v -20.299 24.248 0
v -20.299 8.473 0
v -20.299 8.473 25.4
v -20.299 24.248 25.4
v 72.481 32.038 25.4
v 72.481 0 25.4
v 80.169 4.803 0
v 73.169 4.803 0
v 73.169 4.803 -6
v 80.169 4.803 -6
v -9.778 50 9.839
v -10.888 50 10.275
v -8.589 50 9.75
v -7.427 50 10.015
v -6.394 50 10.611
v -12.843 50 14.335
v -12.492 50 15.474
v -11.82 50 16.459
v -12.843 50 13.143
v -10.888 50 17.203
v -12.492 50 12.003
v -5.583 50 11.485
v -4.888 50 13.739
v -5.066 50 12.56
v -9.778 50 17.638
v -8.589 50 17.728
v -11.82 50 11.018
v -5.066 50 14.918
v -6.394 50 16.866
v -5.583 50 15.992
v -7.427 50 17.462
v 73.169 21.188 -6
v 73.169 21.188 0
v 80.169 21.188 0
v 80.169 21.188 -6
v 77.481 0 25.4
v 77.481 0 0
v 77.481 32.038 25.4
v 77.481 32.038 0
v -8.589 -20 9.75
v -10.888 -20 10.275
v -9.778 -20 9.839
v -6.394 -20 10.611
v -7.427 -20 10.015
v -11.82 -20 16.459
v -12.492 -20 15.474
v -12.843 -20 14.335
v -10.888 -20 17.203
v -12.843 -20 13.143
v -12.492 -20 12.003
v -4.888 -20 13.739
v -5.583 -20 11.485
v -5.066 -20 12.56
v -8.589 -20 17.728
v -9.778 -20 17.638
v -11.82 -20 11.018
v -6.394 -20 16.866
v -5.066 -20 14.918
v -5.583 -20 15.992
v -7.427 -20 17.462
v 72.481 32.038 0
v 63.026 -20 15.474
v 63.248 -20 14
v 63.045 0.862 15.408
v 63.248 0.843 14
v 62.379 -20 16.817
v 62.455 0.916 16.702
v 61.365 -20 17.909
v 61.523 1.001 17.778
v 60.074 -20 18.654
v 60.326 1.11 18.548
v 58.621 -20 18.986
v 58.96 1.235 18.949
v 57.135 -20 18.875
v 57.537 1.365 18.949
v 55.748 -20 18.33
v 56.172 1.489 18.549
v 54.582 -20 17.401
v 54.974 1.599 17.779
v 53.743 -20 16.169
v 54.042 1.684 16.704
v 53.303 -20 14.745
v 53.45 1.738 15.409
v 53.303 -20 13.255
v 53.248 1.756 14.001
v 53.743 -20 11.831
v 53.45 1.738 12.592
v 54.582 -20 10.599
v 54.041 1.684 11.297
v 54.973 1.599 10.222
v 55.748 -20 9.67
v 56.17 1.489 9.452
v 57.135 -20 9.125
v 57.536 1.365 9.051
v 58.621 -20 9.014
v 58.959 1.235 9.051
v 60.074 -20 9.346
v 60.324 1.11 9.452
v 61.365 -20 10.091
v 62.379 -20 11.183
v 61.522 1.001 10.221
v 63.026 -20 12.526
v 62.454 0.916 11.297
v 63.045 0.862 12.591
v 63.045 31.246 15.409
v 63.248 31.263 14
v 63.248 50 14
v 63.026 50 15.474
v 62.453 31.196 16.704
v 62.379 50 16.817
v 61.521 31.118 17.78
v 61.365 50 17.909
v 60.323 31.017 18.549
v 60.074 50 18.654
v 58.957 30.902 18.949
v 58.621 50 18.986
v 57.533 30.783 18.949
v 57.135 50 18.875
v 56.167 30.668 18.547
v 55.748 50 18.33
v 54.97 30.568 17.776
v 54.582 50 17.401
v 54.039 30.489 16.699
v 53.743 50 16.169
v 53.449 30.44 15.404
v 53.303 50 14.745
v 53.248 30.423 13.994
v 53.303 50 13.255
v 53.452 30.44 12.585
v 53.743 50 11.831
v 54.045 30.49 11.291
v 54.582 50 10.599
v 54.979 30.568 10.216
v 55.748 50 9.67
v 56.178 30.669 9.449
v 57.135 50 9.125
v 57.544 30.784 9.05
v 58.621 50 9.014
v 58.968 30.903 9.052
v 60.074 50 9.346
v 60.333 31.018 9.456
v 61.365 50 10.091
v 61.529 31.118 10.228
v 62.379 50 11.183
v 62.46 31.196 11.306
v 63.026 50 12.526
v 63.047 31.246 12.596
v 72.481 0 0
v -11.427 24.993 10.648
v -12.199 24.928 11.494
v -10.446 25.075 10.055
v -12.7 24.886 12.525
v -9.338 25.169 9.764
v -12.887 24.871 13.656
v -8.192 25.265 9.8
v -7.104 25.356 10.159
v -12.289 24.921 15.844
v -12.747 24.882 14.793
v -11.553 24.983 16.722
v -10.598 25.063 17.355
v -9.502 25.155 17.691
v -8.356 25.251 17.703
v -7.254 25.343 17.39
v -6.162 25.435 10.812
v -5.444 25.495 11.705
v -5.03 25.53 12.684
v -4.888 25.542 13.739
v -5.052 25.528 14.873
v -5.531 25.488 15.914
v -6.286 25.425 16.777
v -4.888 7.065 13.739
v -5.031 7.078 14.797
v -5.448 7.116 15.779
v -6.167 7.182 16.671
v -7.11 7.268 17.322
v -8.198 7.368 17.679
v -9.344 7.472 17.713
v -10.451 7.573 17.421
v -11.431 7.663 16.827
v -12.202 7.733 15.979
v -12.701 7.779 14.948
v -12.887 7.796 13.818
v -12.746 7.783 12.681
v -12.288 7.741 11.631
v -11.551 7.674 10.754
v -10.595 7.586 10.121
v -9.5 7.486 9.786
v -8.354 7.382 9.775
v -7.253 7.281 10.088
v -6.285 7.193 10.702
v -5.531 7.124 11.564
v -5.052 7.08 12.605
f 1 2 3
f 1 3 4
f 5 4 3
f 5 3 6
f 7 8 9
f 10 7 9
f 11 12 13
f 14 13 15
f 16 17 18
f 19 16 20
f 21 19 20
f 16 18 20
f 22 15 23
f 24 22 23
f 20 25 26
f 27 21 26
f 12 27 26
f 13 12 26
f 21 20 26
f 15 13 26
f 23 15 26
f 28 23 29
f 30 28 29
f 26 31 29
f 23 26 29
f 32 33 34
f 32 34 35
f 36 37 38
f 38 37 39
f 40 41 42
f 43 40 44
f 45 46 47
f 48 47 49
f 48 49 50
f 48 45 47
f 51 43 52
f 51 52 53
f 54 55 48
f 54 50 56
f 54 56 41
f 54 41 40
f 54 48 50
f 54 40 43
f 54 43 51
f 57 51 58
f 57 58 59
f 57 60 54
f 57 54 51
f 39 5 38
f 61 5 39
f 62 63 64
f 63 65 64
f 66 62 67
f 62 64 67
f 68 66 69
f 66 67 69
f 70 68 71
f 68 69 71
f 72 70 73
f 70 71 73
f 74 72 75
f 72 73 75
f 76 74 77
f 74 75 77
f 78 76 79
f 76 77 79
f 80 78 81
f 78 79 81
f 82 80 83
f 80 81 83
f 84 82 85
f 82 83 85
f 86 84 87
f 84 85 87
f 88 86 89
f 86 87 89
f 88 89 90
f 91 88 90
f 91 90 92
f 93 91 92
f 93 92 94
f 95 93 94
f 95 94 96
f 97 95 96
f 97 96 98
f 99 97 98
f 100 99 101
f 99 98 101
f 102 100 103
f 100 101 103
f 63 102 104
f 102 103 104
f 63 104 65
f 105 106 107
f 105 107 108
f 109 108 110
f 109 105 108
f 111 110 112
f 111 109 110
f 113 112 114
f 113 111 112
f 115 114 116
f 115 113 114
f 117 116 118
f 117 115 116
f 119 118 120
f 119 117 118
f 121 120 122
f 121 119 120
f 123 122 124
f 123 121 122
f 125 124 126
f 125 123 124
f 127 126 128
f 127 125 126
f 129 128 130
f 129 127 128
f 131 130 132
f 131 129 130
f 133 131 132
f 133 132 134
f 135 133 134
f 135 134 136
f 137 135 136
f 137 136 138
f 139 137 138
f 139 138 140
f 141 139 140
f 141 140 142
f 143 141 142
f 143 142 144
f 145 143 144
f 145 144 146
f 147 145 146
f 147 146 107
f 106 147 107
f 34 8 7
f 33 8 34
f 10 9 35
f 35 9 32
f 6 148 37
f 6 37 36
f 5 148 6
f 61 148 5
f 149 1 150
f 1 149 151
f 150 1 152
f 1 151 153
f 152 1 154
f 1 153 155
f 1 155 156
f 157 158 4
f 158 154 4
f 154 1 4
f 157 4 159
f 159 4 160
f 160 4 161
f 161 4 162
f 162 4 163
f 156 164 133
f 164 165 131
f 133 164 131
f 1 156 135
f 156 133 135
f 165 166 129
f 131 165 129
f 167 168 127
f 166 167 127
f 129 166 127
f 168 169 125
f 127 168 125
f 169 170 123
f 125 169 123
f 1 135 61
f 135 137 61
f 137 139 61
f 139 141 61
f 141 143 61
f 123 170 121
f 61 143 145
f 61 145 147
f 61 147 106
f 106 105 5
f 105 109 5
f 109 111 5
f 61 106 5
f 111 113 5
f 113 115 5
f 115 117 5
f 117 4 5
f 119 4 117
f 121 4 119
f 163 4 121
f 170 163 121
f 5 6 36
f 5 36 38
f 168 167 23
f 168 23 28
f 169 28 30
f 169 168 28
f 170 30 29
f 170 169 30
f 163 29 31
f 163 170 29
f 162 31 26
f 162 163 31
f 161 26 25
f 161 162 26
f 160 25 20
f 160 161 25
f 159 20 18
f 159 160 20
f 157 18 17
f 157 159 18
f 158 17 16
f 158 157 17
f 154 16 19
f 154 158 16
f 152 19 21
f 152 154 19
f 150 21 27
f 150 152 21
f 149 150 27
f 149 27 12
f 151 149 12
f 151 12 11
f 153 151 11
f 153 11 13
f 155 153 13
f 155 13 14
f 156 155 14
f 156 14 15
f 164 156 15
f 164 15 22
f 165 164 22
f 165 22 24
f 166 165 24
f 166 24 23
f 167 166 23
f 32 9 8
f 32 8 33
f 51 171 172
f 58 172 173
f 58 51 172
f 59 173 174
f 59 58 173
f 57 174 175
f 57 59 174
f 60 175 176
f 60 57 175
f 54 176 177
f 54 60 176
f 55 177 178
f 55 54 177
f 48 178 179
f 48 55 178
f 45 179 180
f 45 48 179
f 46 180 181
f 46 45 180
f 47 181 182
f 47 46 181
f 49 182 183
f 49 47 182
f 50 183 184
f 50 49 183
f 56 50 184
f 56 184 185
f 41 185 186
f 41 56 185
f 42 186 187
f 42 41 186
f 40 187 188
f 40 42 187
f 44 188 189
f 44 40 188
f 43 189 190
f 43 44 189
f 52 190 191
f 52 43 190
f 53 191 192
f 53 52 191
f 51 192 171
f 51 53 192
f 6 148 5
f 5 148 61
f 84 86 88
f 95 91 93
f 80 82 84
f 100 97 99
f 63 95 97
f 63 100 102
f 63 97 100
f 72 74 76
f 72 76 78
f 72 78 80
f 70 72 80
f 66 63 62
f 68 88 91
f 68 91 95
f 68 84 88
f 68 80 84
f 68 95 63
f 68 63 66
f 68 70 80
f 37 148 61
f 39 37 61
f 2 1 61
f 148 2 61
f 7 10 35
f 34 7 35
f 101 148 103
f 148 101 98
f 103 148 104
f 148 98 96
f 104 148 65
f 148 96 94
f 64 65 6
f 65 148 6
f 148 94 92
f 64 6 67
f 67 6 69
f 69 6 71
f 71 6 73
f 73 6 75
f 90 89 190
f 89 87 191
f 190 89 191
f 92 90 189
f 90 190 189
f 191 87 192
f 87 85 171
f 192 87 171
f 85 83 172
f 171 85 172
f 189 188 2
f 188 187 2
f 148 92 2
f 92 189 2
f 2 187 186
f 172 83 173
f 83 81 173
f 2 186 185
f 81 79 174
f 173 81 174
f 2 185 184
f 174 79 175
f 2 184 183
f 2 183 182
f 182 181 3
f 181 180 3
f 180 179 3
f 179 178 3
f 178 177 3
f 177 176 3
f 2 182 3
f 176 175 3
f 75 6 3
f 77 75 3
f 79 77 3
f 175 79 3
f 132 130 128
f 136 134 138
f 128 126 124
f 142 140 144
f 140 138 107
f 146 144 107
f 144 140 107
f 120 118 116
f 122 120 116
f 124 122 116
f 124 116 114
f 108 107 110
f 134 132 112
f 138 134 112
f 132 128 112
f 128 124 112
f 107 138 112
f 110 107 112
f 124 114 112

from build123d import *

# Parameters (mm, degrees)
F0_W           = 92.7798543125
F0_H           = 32.0377349854
F1_DEPTH       = 25.4
F3_DEPTH       = 25
F4_DEPTH       = 25
F6_E4_LEFT_W   = 16.385298688
F6_E4_LEFT_H   = 6
F7_DEPTH       = 7
F8_DEPTH       = 5
F9_R           = 5
F9_R_2         = 4
F10_DEPTH      = 50
F10_DEPTH_BACK = 20


with BuildPart() as f1:
    # F0 (on Top) → F1 (new body)
    with BuildSketch(Plane.XY):
        with Locations((26.091161184, 16.0188674927)):
            Rectangle(F0_W, F0_H)
    extrude(amount=F1_DEPTH)

    # F2 (on face) → F3 (cut)
    with BuildSketch(Plane.XY.offset(25.4)):
        Polygon((-20.2987659723, 24.2482833564), (72.4810883403, 32.0377349854), (-20.2987659723, 32.0377349854), align=None)
        Polygon((-20.2987659723, 0), (72.4810883403, 0), (-20.2987659723, 8.4725329652), align=None)
    extrude(amount=-F3_DEPTH, mode=Mode.SUBTRACT)

    # F4 (cut): faces of the model
    f4_faces = [f1.faces().sort_by_distance(p)[0] for p in [
        (10.6278521319, 29.441251109, 0.4),
        (10.6278521319, 2.8241776551, 0.4),
    ]]
    extrude(f4_faces, amount=-F4_DEPTH, mode=Mode.SUBTRACT)


with BuildPart() as f7:
    # F6_E4_left (on explicit) → F7 (new body)
    with BuildSketch(Plane(origin=(73.1688588858, 4.8025916331, 0), x_dir=(0, 1, 0), z_dir=(-1, 0, 0))):
        with Locations((8.192649344, 3)):
            Rectangle(F6_E4_LEFT_W, F6_E4_LEFT_H)
    extrude(amount=-F7_DEPTH)


with BuildPart() as f8:
    # F8 (new): a face of the model
    f8_faces = [f1.part.faces().sort_by_distance(p)[0] for p in [
        (72.4810883403, 16.0188674927, 12.7),
    ]]
    extrude(f8_faces, amount=F8_DEPTH)


with BuildPart() as f1_1:
    add(f1.part)

    # F9 (on Front) → F10 (join, two sides)
    with BuildSketch(Plane.XZ) as f10_sk:
        with Locations((58.2476481795, 14)):
            Circle(F9_R)
        with Locations((-8.8881440461, 13.738758862)):
            Circle(F9_R_2)
    extrude(amount=-F10_DEPTH)
    extrude(f10_sk.sketch, amount=F10_DEPTH_BACK)


solid = Compound([f7.part, f8.part, f1_1.part])
